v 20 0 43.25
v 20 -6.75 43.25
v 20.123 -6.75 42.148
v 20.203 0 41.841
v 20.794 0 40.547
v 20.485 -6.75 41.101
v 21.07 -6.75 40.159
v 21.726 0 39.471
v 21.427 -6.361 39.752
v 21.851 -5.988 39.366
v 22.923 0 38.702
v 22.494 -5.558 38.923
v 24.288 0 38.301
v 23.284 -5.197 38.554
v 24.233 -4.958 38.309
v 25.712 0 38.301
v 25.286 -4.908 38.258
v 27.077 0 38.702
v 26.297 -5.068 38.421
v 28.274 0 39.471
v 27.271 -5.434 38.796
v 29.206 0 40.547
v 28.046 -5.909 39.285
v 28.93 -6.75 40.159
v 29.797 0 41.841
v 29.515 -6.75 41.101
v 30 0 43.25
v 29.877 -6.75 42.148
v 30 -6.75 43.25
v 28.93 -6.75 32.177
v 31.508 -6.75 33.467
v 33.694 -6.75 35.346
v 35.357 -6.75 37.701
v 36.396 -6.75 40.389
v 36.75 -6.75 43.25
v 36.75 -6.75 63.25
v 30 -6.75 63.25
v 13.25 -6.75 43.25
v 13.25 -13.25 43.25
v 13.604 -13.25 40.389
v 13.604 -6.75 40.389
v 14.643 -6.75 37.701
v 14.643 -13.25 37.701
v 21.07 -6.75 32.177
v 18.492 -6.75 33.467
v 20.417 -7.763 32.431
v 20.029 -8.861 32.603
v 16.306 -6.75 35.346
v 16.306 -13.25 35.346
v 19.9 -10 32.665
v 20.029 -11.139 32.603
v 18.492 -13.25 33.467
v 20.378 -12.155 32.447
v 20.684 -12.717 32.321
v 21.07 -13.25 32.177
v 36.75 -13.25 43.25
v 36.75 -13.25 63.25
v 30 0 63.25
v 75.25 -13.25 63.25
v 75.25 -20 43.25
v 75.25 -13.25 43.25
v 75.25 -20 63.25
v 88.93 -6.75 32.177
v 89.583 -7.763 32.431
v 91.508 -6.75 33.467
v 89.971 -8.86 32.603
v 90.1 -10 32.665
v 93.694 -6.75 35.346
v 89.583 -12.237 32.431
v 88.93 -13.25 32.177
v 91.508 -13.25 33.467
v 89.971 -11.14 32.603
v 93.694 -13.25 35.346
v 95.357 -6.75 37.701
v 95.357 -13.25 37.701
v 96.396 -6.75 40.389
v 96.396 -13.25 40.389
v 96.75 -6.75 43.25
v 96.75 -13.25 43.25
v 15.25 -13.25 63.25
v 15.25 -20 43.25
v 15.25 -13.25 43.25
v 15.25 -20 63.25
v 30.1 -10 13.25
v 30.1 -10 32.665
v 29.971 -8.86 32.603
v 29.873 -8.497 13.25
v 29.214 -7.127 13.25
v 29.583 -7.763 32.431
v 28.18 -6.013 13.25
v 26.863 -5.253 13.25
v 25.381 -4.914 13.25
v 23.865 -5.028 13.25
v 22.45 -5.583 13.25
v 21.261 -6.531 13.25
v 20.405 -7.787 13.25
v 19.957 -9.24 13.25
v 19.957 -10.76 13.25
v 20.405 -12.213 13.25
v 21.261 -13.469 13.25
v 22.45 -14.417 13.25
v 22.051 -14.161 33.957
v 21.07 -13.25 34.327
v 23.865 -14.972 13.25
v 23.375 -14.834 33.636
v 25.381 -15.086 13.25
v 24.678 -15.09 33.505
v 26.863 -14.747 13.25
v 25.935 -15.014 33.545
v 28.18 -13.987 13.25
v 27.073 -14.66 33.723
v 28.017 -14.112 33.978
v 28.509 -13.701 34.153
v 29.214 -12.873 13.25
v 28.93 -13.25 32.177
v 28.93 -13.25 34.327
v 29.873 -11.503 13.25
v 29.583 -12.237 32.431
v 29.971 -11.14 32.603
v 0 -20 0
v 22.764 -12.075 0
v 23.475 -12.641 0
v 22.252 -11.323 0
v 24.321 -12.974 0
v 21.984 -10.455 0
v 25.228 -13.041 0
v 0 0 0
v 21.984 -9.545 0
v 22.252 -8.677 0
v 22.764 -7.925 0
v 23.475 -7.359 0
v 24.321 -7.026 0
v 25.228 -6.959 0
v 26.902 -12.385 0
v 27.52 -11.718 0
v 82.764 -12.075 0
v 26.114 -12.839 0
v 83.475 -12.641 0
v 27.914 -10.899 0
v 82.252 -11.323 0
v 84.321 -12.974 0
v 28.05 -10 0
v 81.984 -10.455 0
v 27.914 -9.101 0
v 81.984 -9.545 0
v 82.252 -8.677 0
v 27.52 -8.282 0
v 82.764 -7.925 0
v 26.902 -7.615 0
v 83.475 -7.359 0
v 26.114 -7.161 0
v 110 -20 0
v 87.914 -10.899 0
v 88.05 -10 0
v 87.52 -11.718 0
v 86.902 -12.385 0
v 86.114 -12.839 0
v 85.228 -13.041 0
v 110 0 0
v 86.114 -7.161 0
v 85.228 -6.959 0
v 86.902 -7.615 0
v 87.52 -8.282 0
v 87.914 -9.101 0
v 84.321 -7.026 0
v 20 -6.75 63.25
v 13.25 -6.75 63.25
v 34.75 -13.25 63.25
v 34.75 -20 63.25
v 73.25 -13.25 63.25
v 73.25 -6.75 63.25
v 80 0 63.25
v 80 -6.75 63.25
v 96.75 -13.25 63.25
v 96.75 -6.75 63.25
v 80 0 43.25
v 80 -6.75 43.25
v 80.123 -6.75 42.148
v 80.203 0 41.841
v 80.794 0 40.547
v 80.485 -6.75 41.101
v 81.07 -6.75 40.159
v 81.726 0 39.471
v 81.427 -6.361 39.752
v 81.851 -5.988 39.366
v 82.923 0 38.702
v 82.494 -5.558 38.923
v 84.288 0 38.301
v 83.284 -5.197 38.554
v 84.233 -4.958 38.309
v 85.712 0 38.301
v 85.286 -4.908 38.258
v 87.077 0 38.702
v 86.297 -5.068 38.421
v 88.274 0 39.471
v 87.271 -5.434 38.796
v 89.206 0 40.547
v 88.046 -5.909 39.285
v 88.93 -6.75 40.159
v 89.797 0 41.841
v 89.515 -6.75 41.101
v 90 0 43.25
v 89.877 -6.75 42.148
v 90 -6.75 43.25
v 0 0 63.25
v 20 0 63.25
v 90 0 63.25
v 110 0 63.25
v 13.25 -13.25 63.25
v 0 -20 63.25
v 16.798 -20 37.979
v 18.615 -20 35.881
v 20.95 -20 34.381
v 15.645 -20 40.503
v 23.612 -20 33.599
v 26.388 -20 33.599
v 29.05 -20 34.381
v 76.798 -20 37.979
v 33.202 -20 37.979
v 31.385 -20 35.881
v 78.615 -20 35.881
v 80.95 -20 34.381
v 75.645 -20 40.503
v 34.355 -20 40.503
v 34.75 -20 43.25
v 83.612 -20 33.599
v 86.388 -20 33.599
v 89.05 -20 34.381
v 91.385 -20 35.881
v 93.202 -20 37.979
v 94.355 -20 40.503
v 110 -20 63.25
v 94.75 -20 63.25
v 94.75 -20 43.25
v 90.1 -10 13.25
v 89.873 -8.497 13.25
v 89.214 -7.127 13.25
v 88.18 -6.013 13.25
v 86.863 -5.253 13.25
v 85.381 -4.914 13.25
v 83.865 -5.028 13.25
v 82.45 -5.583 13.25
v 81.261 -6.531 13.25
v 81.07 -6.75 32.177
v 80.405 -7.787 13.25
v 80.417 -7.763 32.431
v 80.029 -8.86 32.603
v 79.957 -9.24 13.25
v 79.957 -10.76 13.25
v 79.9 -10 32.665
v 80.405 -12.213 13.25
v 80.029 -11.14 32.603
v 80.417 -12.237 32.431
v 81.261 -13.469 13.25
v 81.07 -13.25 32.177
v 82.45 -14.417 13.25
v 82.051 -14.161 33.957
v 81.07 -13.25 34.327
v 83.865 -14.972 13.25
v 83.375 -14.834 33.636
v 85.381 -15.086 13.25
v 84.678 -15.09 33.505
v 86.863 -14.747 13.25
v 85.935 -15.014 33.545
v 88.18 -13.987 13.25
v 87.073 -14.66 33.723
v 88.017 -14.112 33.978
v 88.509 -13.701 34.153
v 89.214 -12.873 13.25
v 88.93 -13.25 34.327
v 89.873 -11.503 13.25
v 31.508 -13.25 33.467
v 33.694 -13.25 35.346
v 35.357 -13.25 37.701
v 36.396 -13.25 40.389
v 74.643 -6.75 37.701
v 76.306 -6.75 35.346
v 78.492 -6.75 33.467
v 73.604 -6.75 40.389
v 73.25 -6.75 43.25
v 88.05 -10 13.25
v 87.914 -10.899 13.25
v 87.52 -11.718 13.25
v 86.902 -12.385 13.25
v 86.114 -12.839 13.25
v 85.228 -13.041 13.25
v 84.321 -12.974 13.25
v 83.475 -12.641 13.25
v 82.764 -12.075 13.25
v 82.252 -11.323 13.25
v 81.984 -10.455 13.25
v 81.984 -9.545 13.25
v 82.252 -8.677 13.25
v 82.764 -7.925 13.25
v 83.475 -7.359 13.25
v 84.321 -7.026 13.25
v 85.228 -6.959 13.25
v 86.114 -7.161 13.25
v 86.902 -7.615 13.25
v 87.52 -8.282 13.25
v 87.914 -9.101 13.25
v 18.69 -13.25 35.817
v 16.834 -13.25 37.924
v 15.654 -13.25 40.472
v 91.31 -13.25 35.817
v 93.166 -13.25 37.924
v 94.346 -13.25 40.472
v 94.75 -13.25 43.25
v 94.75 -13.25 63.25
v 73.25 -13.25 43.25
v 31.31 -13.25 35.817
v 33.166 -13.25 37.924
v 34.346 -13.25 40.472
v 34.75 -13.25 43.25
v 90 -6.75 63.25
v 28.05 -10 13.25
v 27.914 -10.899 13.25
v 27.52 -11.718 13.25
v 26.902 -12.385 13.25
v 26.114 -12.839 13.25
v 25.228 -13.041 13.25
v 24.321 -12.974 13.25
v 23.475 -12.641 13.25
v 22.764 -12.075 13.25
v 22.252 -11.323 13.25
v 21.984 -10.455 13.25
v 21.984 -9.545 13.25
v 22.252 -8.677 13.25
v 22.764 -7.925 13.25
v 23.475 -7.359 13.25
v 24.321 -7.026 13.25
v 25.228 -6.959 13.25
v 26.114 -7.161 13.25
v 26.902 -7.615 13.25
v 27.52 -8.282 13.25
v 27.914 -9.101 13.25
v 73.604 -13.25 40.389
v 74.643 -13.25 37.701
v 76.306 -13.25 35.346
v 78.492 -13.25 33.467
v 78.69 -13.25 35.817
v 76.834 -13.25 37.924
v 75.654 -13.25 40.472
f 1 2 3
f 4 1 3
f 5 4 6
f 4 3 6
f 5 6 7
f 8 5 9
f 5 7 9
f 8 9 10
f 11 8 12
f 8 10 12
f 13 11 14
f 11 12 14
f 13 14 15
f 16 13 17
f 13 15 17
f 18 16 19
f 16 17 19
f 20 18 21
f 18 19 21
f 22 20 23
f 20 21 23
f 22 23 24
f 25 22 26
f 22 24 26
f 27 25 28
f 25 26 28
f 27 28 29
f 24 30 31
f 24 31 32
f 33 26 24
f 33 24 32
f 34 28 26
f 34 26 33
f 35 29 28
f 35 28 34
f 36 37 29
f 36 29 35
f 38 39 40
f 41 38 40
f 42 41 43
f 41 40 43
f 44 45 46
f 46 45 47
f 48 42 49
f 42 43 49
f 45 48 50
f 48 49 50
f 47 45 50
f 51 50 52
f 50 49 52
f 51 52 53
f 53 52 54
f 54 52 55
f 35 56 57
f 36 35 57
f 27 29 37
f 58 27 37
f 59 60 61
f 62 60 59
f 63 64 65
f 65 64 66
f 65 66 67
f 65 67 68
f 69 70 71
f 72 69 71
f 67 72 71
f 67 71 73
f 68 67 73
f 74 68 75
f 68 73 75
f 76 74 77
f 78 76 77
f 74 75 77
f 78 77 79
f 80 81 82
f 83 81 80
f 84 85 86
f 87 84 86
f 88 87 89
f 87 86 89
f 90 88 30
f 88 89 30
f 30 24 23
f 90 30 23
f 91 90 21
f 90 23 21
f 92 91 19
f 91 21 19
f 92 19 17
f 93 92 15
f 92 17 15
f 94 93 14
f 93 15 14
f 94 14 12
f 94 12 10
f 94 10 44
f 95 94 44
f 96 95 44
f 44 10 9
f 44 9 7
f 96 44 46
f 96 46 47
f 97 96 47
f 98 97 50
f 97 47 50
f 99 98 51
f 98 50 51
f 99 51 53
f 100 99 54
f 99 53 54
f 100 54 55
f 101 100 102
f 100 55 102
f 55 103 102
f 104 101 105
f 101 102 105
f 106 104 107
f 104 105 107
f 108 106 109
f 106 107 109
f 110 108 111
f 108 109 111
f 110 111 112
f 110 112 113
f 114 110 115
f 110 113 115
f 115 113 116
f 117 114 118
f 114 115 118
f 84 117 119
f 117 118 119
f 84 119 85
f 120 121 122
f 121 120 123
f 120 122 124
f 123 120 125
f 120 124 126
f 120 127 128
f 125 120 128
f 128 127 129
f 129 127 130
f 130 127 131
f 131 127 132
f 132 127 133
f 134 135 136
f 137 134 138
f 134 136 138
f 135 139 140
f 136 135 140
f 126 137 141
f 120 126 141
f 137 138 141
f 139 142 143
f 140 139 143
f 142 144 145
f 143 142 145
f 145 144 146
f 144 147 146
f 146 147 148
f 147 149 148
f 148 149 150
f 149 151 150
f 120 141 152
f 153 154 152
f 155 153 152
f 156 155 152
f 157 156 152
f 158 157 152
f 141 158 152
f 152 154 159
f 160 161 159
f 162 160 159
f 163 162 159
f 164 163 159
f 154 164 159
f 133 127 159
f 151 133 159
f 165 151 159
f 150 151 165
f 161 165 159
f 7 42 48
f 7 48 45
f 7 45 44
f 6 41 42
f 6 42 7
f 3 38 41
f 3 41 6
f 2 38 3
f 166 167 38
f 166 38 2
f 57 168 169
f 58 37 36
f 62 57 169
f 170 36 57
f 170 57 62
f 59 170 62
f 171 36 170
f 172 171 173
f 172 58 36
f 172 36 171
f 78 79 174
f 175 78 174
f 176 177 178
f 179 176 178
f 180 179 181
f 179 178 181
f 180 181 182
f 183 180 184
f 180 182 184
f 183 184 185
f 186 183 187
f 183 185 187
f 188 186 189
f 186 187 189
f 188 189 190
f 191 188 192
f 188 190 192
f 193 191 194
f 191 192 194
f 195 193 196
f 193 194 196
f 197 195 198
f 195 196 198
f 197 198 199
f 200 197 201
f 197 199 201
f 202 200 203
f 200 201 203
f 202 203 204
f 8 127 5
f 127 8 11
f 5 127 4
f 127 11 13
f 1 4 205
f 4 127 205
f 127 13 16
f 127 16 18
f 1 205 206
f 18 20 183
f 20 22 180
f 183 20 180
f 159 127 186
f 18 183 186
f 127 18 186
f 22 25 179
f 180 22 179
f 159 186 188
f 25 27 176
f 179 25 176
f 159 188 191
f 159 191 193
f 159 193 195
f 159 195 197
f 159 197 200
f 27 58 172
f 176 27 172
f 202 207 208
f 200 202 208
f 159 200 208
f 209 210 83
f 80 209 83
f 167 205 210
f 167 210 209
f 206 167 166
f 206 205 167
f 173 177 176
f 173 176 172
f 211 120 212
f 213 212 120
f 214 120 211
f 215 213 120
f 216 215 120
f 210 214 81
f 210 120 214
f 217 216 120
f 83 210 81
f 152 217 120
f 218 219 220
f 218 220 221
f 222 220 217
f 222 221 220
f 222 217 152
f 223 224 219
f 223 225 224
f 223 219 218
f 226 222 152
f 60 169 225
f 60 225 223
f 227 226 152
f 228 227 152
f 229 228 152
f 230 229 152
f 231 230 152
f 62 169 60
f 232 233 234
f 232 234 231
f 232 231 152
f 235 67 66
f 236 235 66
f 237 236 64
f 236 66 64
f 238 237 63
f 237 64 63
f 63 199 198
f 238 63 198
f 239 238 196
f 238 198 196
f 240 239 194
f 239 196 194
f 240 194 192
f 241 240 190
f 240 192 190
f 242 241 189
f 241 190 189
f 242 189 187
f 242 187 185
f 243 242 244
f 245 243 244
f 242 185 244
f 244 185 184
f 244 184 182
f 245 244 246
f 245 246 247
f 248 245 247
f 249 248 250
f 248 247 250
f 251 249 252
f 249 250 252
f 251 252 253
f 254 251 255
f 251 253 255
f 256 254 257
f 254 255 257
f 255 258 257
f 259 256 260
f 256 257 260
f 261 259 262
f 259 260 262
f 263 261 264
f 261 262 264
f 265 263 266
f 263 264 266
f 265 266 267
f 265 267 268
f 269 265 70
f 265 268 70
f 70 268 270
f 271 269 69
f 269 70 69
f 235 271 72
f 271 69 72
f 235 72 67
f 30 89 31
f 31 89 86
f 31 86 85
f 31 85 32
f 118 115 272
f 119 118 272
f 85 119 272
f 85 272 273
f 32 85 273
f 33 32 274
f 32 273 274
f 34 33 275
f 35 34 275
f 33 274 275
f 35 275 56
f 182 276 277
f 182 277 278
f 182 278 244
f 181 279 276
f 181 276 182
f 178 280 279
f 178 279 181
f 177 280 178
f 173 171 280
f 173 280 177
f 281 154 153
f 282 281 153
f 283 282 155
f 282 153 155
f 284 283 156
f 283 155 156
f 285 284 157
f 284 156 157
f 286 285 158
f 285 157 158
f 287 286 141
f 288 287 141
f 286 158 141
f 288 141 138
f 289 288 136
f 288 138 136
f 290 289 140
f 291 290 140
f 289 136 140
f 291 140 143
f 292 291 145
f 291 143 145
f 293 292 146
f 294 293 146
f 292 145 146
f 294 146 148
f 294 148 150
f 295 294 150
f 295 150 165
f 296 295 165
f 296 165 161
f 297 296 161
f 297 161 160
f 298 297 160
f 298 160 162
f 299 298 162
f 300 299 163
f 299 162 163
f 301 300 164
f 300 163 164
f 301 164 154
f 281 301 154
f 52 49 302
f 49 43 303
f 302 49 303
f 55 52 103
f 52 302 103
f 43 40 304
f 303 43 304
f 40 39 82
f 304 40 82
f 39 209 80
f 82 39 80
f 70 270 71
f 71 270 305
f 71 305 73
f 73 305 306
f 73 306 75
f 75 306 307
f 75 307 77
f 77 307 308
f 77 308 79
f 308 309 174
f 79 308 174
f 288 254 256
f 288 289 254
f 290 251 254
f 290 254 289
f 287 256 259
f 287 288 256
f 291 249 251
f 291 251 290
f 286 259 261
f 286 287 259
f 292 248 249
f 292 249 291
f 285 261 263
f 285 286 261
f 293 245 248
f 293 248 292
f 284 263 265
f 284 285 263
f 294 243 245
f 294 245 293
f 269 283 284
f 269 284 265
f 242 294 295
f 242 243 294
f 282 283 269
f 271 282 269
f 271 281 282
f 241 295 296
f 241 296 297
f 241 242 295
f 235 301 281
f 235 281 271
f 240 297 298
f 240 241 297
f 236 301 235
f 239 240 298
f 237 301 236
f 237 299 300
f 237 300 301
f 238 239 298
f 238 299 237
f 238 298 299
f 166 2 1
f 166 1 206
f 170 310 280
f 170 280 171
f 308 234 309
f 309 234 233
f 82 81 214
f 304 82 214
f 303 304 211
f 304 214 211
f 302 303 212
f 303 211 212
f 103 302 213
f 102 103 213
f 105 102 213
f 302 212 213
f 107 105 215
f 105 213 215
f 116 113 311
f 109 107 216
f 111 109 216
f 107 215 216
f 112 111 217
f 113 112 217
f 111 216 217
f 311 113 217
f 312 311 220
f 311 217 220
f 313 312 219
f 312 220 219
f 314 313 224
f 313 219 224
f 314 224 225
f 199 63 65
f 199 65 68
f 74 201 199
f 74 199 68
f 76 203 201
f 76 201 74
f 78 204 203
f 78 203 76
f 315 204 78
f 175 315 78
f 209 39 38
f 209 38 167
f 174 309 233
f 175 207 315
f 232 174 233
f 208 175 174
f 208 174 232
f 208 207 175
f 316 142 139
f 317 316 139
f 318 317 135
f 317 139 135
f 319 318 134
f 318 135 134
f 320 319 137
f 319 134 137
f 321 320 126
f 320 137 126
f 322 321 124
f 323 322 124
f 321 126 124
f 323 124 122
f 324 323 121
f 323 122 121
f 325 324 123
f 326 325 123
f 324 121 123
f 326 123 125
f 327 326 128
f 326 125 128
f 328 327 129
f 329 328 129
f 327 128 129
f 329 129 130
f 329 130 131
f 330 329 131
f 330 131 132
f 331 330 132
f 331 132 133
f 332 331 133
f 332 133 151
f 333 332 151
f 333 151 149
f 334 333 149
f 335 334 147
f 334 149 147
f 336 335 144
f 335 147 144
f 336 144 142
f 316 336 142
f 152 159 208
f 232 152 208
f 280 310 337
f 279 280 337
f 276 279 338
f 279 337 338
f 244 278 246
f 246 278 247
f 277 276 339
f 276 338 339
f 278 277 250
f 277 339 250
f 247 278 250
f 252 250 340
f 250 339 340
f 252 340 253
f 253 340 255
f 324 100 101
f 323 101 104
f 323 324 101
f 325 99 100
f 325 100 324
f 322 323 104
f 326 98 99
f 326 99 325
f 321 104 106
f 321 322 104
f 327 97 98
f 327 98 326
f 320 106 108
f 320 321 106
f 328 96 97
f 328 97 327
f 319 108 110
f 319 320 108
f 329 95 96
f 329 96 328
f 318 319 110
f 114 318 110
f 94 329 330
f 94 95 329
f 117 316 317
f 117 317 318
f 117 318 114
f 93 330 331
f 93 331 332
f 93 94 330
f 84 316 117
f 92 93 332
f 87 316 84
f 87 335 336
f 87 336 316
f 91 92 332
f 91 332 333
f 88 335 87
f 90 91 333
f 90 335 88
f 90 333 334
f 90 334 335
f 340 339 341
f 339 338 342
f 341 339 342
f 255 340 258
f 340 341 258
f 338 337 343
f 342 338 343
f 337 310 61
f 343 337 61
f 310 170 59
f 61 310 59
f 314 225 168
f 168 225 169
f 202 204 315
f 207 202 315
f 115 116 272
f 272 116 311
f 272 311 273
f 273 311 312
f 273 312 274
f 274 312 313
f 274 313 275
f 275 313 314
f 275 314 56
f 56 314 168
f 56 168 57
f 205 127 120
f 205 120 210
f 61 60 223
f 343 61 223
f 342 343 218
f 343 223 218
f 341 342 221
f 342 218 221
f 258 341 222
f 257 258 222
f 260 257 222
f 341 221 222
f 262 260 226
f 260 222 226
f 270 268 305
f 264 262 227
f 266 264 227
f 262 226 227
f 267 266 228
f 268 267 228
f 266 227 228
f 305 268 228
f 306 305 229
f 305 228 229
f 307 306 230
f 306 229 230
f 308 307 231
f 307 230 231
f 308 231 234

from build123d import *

# Parameters (mm, degrees)
F0_W      = 110
F0_H      = 63.25
F1_DEPTH  = 20
F2_R      = 9.75
F3_DEPTH  = 6.75
F4_R      = 11.75
F5_DEPTH  = 6.5
F6_R      = 5
F7_DEPTH  = 6.75
F8_W      = 19.5
F8_H      = 20
F9_DEPTH  = 6.75
F10_W     = 23.5
F10_H     = 20
F11_DEPTH = 6.5
F12_W     = 10
F12_H     = 20
F13_DEPTH = 6.75
F14_R     = 5.1
F15_DEPTH = 50
F16_R     = 3.05
F17_DEPTH = 13.25


with BuildPart() as f1:
    # F0 (on Front) → F1 (new body)
    with BuildSketch(Plane.XZ):
        with Locations((55, 31.625)):
            Rectangle(F0_W, F0_H)
    extrude(amount=F1_DEPTH)

    # F2 (on face) → F3 (cut)
    with BuildSketch(Plane.XZ.offset(20)):
        with Locations((25, 43.25)):
            Circle(F2_R)
        with Locations((85, 43.25)):
            Circle(F2_R)
    extrude(amount=-F3_DEPTH, mode=Mode.SUBTRACT)

    # F4 (on face) → F5 (cut)
    with BuildSketch(Plane.XZ.offset(13.25)):
        with Locations((25, 43.25)):
            Circle(F4_R)
        with Locations((85, 43.25)):
            Circle(F4_R)
    extrude(amount=-F5_DEPTH, mode=Mode.SUBTRACT)

    # F6 (on face) → F7 (cut, through all)
    with BuildSketch(Plane.XZ.offset(6.75)):
        with Locations((25, 43.25)):
            Circle(F6_R)
        with Locations((85, 43.25)):
            Circle(F6_R)
    extrude(amount=-F7_DEPTH, mode=Mode.SUBTRACT)

    # F8 (on face) + F6 (on face) → F9 (cut)
    with BuildSketch(Plane.XZ.offset(20)):
        with Locations((25, 53.25)):
            Rectangle(F8_W, F8_H)
        with Locations((85, 53.25)):
            Rectangle(F8_W, F8_H)
    with BuildSketch(Plane.XZ.offset(6.75)):
        with Locations((25, 43.25)):
            Circle(F6_R)
        with Locations((85, 43.25)):
            Circle(F6_R)
    extrude(amount=-F9_DEPTH, mode=Mode.SUBTRACT)

    # F10 (on face) → F11 (cut)
    with BuildSketch(Plane.XZ.offset(13.25)):
        with Locations((25, 53.25)):
            Rectangle(F10_W, F10_H)
        with Locations((85, 53.25)):
            Rectangle(F10_W, F10_H)
    extrude(amount=-F11_DEPTH, mode=Mode.SUBTRACT)

    # F12 (on face) → F13 (cut, through all)
    with BuildSketch(Plane.XZ.offset(6.75)):
        with Locations((25, 53.25)):
            Rectangle(F12_W, F12_H)
        with Locations((85, 53.25)):
            Rectangle(F12_W, F12_H)
    extrude(amount=-F13_DEPTH, mode=Mode.SUBTRACT)

    # F14 (on face) → F15 (cut)
    with BuildSketch(Plane.XY.offset(63.25)):
        with Locations((25, -10)):
            Circle(F14_R)
        with Locations((85, -10)):
            Circle(F14_R)
    extrude(amount=-F15_DEPTH, mode=Mode.SUBTRACT)

    # F16 (on face) → F17 (cut, through all)
    with BuildSketch(Plane(origin=(0, 0, 0), x_dir=(1, 0, 0), z_dir=(0, 0, -1))):
        with Locations((25, 10)):
            Circle(F16_R)
        with Locations((85, 10)):
            Circle(F16_R)
    extrude(amount=-F17_DEPTH, mode=Mode.SUBTRACT)


solid = f1.part
